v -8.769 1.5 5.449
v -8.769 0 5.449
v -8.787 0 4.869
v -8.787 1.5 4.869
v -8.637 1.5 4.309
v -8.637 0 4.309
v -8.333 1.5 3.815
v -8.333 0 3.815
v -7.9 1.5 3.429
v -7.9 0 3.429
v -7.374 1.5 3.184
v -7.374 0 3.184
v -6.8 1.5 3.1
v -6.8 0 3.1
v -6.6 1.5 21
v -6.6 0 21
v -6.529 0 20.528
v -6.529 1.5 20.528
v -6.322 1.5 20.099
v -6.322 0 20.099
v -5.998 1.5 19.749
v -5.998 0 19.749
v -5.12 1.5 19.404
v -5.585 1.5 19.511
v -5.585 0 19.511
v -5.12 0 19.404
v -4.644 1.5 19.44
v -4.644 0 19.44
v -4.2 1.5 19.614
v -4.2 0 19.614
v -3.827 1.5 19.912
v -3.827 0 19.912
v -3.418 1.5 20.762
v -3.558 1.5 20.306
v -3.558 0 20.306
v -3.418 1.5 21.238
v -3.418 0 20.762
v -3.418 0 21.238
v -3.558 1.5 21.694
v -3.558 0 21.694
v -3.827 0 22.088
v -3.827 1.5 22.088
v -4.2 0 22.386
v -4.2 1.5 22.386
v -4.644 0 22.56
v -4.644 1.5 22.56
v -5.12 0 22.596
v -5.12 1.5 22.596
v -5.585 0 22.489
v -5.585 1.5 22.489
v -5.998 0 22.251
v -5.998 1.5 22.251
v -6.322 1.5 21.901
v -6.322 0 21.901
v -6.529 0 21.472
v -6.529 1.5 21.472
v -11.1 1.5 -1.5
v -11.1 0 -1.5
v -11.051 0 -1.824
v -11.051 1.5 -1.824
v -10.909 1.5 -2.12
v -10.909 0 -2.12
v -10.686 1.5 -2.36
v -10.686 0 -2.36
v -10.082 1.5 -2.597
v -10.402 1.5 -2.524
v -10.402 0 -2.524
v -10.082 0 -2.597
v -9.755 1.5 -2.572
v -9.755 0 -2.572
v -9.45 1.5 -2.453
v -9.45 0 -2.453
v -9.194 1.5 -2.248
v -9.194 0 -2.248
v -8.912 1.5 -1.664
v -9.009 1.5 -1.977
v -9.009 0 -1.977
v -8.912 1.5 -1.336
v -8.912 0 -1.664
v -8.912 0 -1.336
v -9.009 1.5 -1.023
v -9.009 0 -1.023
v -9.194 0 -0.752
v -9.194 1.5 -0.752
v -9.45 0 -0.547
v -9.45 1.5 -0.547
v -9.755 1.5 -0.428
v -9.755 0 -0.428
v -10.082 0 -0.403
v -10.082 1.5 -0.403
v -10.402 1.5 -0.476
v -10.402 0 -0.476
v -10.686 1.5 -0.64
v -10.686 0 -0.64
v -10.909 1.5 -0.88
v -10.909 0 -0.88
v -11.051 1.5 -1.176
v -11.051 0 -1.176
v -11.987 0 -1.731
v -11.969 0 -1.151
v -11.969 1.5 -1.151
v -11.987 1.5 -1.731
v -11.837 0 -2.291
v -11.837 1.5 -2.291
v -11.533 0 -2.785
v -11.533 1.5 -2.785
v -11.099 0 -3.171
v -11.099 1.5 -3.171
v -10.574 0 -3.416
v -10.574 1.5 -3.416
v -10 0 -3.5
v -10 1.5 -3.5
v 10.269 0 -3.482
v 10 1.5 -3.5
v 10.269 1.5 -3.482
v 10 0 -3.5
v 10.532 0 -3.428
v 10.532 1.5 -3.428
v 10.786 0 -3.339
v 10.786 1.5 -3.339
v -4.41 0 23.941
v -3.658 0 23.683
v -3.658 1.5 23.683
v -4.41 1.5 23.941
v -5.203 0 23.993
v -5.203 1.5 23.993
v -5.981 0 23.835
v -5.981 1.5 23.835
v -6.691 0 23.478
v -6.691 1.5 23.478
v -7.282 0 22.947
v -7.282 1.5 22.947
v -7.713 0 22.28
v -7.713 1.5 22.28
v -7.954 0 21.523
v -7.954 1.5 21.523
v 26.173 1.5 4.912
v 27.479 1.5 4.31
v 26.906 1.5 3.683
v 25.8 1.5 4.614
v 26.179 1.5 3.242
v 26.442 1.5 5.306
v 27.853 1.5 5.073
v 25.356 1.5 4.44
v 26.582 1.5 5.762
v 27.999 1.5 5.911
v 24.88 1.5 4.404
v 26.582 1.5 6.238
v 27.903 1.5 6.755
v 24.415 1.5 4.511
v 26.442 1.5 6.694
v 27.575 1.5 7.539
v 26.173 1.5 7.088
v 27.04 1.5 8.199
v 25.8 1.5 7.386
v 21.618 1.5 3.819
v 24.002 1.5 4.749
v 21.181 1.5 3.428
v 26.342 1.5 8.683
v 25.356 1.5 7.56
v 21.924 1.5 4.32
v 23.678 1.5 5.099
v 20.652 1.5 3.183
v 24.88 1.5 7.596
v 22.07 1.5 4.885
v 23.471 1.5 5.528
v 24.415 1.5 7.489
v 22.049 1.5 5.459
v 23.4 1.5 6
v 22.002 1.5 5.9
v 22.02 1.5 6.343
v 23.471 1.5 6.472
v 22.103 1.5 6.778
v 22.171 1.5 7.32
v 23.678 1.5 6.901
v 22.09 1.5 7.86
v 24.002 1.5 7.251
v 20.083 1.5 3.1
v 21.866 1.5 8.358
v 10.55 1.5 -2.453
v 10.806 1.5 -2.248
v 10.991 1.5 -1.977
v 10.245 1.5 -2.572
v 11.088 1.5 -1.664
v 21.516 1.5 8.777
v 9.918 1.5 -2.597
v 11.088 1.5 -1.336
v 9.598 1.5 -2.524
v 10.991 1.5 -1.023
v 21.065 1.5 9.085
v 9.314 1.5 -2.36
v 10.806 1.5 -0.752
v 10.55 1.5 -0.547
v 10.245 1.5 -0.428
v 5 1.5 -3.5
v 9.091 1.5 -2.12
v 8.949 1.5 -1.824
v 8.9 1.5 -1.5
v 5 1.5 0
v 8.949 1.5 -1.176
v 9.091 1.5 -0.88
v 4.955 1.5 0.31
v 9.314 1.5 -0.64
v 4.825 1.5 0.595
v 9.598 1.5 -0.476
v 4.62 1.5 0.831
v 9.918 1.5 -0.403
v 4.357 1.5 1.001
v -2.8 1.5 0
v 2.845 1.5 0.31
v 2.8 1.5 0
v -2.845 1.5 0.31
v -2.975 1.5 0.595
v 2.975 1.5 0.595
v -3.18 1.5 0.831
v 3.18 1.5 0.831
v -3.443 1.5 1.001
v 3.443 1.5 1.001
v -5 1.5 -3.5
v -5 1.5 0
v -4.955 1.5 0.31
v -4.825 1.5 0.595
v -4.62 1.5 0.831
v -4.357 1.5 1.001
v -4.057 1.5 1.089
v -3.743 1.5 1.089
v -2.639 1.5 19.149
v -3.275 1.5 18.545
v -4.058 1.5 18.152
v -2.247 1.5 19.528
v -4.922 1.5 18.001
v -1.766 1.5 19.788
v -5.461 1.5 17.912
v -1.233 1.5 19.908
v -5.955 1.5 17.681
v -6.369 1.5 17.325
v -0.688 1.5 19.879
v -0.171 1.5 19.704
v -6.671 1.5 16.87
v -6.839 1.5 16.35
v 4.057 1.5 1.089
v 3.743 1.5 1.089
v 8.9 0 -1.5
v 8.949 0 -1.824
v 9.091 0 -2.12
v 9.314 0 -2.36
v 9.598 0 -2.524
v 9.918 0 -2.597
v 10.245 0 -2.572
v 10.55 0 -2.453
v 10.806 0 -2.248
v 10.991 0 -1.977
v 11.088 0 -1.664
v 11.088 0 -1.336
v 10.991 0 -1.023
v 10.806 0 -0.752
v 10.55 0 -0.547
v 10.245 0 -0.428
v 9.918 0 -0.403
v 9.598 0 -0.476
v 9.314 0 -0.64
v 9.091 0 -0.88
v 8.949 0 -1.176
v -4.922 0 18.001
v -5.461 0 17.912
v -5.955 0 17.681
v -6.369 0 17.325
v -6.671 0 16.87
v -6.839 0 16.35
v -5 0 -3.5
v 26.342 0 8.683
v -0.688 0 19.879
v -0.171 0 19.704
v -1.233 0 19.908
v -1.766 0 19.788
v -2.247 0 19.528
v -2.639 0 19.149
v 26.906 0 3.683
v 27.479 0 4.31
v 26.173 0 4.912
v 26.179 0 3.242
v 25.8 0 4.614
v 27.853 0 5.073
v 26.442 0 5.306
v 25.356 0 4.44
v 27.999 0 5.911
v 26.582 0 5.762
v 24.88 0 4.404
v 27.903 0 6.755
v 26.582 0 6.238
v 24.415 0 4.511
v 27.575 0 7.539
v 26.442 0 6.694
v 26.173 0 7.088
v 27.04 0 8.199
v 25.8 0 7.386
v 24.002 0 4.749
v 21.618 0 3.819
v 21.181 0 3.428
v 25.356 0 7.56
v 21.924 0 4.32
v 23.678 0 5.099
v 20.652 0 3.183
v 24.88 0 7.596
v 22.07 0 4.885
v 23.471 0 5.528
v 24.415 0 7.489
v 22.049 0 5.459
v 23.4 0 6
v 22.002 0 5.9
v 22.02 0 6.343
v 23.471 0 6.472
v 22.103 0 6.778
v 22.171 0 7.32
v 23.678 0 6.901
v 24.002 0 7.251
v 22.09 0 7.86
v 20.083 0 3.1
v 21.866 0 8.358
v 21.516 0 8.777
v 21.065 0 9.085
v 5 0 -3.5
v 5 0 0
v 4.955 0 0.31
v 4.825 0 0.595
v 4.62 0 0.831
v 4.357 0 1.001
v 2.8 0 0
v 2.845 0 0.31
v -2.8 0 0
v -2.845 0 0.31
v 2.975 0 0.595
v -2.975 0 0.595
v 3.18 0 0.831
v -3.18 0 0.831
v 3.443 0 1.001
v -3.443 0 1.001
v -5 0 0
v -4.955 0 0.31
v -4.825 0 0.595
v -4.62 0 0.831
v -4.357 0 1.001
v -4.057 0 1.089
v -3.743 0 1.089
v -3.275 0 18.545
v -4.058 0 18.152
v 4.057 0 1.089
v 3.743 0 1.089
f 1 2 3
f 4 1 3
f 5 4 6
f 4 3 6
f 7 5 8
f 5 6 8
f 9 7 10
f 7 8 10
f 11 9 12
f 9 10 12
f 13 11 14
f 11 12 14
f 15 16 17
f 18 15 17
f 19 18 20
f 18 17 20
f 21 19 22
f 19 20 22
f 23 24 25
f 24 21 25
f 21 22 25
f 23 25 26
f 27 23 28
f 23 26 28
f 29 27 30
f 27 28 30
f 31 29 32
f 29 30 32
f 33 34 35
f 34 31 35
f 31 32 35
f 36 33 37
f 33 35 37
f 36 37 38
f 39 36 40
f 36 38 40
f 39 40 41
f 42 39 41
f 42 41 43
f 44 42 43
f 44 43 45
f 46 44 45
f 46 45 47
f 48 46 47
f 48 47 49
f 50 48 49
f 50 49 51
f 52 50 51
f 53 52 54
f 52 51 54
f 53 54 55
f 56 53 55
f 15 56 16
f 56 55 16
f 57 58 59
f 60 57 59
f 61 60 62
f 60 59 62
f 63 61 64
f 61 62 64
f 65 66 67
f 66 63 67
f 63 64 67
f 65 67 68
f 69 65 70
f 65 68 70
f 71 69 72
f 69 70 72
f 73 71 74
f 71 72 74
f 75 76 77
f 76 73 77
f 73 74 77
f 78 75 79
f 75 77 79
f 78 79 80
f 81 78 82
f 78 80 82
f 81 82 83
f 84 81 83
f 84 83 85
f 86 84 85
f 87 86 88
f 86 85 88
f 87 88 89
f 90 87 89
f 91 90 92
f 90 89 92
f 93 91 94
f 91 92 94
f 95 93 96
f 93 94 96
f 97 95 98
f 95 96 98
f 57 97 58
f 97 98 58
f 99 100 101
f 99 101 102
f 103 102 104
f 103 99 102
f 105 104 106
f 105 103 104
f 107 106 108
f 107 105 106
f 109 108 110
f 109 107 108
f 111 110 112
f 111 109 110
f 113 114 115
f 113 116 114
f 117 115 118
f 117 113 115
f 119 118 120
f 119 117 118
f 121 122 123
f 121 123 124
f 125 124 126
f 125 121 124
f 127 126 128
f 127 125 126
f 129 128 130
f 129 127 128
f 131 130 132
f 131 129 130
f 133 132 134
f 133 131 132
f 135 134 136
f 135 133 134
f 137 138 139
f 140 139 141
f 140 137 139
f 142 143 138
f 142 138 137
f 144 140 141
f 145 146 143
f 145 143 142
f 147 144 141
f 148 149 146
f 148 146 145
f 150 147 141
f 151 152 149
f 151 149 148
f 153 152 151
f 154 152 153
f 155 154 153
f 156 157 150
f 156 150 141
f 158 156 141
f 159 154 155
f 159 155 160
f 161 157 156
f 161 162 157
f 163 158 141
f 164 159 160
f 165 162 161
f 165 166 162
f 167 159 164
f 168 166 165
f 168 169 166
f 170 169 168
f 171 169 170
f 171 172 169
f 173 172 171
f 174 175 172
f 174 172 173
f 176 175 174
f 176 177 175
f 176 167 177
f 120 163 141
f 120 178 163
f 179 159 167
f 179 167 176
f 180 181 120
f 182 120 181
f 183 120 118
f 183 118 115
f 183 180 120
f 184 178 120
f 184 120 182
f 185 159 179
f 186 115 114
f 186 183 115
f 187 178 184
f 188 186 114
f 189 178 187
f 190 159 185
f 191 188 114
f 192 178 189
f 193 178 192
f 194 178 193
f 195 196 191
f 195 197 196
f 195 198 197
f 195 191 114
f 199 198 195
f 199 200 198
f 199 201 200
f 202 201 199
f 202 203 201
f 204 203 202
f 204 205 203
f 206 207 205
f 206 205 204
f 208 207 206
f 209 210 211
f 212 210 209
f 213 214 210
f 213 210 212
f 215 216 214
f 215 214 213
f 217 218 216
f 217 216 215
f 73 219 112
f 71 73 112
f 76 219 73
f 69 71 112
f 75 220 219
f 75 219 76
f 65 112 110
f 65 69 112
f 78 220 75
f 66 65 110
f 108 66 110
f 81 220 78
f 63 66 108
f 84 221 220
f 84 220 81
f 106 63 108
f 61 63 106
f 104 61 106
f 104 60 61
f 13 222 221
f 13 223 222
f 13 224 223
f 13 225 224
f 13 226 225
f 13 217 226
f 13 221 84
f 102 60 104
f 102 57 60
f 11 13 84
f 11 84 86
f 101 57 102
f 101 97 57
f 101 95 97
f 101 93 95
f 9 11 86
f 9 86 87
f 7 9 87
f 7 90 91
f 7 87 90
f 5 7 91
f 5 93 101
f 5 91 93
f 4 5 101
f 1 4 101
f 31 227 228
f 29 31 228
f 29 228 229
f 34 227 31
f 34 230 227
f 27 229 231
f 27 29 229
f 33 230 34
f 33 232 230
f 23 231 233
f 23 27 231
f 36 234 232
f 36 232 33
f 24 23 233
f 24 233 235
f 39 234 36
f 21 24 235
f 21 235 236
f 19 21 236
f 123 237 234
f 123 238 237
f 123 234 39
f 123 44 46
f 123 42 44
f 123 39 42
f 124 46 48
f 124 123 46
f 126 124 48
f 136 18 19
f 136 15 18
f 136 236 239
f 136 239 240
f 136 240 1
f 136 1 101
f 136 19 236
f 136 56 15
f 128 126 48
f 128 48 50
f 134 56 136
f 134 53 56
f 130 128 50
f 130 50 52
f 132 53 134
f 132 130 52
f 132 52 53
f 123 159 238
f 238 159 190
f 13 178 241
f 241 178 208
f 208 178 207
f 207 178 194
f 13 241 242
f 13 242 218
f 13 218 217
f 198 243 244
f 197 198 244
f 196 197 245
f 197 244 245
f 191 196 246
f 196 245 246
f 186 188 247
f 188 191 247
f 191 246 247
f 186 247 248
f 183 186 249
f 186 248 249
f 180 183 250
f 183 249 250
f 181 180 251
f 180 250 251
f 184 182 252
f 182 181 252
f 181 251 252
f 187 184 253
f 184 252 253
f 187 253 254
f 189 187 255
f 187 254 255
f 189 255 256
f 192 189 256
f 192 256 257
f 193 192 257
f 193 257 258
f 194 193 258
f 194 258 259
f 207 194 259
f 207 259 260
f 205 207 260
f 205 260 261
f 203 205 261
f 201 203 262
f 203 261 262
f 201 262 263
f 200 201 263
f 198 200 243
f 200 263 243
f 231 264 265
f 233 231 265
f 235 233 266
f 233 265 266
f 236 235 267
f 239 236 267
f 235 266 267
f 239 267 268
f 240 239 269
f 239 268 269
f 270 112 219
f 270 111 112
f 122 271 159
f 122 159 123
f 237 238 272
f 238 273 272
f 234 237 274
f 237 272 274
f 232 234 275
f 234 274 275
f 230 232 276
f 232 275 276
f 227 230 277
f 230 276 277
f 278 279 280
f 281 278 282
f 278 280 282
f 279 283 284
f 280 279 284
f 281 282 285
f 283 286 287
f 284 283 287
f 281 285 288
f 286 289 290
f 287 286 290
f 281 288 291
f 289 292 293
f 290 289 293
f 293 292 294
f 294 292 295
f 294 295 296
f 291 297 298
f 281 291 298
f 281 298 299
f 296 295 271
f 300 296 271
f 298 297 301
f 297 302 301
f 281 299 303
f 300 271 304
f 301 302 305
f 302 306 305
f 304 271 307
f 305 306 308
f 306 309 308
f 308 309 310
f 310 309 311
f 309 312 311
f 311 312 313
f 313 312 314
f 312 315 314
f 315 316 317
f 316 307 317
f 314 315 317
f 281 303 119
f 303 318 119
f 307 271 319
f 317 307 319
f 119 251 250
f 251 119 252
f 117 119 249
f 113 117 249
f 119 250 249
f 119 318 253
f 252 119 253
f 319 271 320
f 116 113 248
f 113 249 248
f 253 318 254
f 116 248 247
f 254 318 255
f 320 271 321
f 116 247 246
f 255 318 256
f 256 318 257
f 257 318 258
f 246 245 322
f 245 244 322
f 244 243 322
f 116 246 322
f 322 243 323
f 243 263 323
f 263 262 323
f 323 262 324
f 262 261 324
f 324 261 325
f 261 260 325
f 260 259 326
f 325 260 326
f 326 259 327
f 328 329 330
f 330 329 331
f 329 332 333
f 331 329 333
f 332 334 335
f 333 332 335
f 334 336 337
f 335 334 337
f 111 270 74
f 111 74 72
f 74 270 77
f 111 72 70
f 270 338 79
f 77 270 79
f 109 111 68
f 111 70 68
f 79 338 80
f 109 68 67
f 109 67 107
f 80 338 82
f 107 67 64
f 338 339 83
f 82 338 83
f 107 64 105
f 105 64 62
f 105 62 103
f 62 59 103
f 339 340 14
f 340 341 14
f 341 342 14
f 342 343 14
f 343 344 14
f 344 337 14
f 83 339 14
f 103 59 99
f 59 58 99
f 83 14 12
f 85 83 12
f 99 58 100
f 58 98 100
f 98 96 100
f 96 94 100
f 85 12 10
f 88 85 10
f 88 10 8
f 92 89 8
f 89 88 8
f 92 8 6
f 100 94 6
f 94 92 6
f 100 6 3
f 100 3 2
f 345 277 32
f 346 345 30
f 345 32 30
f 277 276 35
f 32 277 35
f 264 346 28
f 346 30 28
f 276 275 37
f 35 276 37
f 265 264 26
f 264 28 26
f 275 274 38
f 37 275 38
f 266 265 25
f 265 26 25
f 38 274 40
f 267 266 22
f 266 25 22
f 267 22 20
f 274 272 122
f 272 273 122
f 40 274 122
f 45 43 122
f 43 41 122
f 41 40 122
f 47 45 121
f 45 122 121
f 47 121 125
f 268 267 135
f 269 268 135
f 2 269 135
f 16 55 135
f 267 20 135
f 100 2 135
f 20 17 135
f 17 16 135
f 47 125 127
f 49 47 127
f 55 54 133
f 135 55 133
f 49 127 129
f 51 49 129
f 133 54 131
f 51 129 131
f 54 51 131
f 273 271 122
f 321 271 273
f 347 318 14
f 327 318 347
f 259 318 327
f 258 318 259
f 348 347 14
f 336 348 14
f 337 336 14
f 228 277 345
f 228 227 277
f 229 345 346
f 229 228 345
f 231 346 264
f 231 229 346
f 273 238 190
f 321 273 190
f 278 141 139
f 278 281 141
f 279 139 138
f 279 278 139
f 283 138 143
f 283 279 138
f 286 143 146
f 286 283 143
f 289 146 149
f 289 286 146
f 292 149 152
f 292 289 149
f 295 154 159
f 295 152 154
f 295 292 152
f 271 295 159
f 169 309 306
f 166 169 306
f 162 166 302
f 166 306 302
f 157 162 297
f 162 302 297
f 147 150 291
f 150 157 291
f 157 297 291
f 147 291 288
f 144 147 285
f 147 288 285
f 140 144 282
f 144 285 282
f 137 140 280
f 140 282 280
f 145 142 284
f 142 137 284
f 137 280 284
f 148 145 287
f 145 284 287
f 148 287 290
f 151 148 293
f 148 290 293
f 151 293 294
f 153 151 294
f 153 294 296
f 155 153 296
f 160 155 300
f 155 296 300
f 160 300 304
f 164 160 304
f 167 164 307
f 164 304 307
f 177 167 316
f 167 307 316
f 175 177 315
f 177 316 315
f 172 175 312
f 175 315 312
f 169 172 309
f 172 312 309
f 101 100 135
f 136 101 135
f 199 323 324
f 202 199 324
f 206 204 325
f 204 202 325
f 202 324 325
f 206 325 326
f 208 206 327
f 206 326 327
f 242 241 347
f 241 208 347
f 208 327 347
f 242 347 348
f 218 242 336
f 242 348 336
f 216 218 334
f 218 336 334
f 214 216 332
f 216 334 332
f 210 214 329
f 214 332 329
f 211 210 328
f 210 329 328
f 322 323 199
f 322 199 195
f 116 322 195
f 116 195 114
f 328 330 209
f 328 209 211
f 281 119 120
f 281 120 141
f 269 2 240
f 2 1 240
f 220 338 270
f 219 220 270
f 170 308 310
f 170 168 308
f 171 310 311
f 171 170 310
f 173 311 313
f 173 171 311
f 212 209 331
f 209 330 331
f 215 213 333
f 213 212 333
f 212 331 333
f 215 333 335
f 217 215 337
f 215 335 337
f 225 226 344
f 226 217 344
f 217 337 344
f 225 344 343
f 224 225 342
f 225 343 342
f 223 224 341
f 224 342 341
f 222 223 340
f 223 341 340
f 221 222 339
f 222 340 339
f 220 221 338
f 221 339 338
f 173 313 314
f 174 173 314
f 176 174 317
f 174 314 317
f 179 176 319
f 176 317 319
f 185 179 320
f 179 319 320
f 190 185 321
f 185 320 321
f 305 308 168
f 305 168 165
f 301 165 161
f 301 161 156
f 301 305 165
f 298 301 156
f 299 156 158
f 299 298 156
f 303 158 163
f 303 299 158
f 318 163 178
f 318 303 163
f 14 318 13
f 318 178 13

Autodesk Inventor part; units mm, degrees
ref_plane "YZ Plane" through (0, 0, 0) normal (1, 0, 0) x (0, 1, 0)
ref_plane "XZ Plane" through (0, 0, 0) normal (0, 1, 0) x (-1, 0, 0)
ref_plane "XY Plane" through (0, 0, 0) normal (0, 0, 1) x (1, 0, 0)
sketch "スケッチ1" plane through (0, 0, 0) normal (0, 1, 0) x (-1, 0, 0)
  line L0 (5, 0) -> (-5, 0)
  line L1 (-5, 0) -> (-5, -3)
  line L2 (-5, -3) -> (5, -3)
  line L3 (5, -3) -> (5, 0)
  circle A0 centre (3.9, 0) radius 1.1
  line L4 (0, -3) -> (0, 0) construction
  circle A1 centre (-3.9, 0) radius 1.1
  line L5 (-5, -1.5) -> (5, -1.5) construction
  circle A2 centre (3.9, -3) radius 1.1
  circle A3 centre (-3.9, -3) radius 1.1
  circle A4 centre (-10, -1.5) radius 1.1
  circle A5 centre (10, -1.5) radius 1.1
  circle A6 centre (10, -1.5) radius 2
  circle A7 centre (-10, -1.5) radius 2
  line L6 (10, -3.5) -> (-10, -3.5)
  line L7 (-5, -3) -> (-5, -3.5)
  line L8 (5, -3) -> (5, -3.5)
  circle A8 centre (-25, 6) radius 1.6
  circle A9 centre (5, 21) radius 1.6
  line L9 (-25, 6) -> (5, 6) construction
  line L10 (5, 6) -> (5, 21) construction
  line L11 (5, 21) -> (-25, 6) construction
  circle A10 centre (-25, 6) radius 3
  circle A11 centre (5, 21) radius 3
  line L12 (11.9694, -1.1513) -> (7.954, 21.5231)
  line L13 (-10.7862, -3.339) -> (-26.1793, 3.2415)
  line L14 (-26.3416, 8.6833) -> (3.6584, 23.6833)
  point P0 (-2.8, 0)
  point P1 (2.8, 0)
  dimension "d2" = 2.2
  dimension "d0" = 10
  dimension "d1" = 3
  dimension "d3" = 2.2
  dimension "d4" = 5
  dimension "d5" = 4
  dimension "d6" = 4
  dimension "d7" = 3.2
  dimension "d8" = 3.2
  dimension "d9" = 15
  dimension "d10" = 30
  dimension "d11" = 6
  dimension "d12" = 6
  dimension "d15" = 15
  dimension "d17" = 6
extrude "押し出し1" add sketch "スケッチ1" along normal blind 1.5 contours A1 L1 L7 L6 A7 L13 A10 L14 A11 L12 A6 L8 L3 A0 L0 | A7 | A6 | A10 | A11
sketch "スケッチ2" plane through (0, 1.5, 0) normal (0, 1, 0) x (1, 0, 0)
  line L0 (-9.1854, -3.1) -> (-5.7511, -22.4936)
  line L1 (-5.7511, -22.4936) -> (27.378, -5.929)
  line L2 (27.378, -5.929) -> (20.7603, -3.1)
  line L3 (20.7603, -3.1) -> (-9.1854, -3.1)
  line L4 (10, 3.5) -> (5, 3.5) projected
  line L5 (26.1793, -3.2415) -> (10.7862, 3.339) projected
  line L6 (-11.9694, 1.1513) -> (-7.954, -21.5231) projected
  line L7 (-3.6584, -23.6833) -> (26.3416, -8.6833) projected
  arc A0 (2.8, 0) -> (5, 0) centre (3.9, 0) ccw projected
  line L8 (-3.6584, -23.6833) -> (26.3416, -8.6833) projected
  arc A1 (26.3416, -8.6833) -> (26.1793, -3.2415) centre (25, -6) ccw projected
  line L9 (26.1793, -3.2415) -> (10.7862, 3.339) projected
  arc A2 (10.7862, 3.339) -> (10, 3.5) centre (10, 1.5) ccw projected
  line L10 (10, 3.5) -> (5, 3.5) projected
  line L11 (5, 3.5) -> (5, 0) projected
  arc A3 (2.8, 0) -> (5, 0) centre (3.9, 0) ccw projected
  line L12 (2.8, 0) -> (-2.8, 0) projected
  arc A4 (-5, 0) -> (-2.8, 0) centre (-3.9, 0) ccw projected
  line L13 (-5, 0) -> (-5, 3.5) projected
  line L14 (-5, 3.5) -> (-10, 3.5) projected
  arc A5 (-10, 3.5) -> (-11.9694, 1.1513) centre (-10, 1.5) ccw projected
  line L15 (-11.9694, 1.1513) -> (-7.954, -21.5231) projected
  arc A6 (-7.954, -21.5231) -> (-3.6584, -23.6833) centre (-5, -21) ccw projected
  circle A7 centre (10, 1.5) radius 1.1 projected
  circle A8 centre (25, -6) radius 1.6 projected
  circle A9 centre (-10, 1.5) radius 1.1 projected
  circle A10 centre (-5, -21) radius 1.6 projected
  circle A11 centre (-5, -21) radius 3
  circle A12 centre (25, -6) radius 3
  point P0 (0, 0)
  point P1 (3.9, -1.1)
  point P2 (-6.4779, -18.3893)
  point P3 (-2.023, -20.6295)
  point P4 (22.9174, -8.1593)
  point P5 (22.7923, -3.9687)
  dimension "d18" = 2
  dimension "d19" = 2
  dimension "d20" = 2
  dimension "d22" = 2
extrude "押し出し2" cut sketch "スケッチ2" against normal through all contours L3 L2 A12 L1 A11 L0
fillet "フィレット1" radius 2 6 edges at (22.7923, 0.75, 3.9687) (22.9174, 0.75, 8.1593) (20.7603, 0.75, 3.1) (-9.1854, 0.75, 3.1) (-2.023, 0.75, 20.6295) (-6.4779, 0.75, 18.3893)
equation "\"d18\" = d22"
equation "\"d19\" = d18"
equation "\"d20\" = d19"
properties part number "momo" material "アルミニウム 2014-T4"
